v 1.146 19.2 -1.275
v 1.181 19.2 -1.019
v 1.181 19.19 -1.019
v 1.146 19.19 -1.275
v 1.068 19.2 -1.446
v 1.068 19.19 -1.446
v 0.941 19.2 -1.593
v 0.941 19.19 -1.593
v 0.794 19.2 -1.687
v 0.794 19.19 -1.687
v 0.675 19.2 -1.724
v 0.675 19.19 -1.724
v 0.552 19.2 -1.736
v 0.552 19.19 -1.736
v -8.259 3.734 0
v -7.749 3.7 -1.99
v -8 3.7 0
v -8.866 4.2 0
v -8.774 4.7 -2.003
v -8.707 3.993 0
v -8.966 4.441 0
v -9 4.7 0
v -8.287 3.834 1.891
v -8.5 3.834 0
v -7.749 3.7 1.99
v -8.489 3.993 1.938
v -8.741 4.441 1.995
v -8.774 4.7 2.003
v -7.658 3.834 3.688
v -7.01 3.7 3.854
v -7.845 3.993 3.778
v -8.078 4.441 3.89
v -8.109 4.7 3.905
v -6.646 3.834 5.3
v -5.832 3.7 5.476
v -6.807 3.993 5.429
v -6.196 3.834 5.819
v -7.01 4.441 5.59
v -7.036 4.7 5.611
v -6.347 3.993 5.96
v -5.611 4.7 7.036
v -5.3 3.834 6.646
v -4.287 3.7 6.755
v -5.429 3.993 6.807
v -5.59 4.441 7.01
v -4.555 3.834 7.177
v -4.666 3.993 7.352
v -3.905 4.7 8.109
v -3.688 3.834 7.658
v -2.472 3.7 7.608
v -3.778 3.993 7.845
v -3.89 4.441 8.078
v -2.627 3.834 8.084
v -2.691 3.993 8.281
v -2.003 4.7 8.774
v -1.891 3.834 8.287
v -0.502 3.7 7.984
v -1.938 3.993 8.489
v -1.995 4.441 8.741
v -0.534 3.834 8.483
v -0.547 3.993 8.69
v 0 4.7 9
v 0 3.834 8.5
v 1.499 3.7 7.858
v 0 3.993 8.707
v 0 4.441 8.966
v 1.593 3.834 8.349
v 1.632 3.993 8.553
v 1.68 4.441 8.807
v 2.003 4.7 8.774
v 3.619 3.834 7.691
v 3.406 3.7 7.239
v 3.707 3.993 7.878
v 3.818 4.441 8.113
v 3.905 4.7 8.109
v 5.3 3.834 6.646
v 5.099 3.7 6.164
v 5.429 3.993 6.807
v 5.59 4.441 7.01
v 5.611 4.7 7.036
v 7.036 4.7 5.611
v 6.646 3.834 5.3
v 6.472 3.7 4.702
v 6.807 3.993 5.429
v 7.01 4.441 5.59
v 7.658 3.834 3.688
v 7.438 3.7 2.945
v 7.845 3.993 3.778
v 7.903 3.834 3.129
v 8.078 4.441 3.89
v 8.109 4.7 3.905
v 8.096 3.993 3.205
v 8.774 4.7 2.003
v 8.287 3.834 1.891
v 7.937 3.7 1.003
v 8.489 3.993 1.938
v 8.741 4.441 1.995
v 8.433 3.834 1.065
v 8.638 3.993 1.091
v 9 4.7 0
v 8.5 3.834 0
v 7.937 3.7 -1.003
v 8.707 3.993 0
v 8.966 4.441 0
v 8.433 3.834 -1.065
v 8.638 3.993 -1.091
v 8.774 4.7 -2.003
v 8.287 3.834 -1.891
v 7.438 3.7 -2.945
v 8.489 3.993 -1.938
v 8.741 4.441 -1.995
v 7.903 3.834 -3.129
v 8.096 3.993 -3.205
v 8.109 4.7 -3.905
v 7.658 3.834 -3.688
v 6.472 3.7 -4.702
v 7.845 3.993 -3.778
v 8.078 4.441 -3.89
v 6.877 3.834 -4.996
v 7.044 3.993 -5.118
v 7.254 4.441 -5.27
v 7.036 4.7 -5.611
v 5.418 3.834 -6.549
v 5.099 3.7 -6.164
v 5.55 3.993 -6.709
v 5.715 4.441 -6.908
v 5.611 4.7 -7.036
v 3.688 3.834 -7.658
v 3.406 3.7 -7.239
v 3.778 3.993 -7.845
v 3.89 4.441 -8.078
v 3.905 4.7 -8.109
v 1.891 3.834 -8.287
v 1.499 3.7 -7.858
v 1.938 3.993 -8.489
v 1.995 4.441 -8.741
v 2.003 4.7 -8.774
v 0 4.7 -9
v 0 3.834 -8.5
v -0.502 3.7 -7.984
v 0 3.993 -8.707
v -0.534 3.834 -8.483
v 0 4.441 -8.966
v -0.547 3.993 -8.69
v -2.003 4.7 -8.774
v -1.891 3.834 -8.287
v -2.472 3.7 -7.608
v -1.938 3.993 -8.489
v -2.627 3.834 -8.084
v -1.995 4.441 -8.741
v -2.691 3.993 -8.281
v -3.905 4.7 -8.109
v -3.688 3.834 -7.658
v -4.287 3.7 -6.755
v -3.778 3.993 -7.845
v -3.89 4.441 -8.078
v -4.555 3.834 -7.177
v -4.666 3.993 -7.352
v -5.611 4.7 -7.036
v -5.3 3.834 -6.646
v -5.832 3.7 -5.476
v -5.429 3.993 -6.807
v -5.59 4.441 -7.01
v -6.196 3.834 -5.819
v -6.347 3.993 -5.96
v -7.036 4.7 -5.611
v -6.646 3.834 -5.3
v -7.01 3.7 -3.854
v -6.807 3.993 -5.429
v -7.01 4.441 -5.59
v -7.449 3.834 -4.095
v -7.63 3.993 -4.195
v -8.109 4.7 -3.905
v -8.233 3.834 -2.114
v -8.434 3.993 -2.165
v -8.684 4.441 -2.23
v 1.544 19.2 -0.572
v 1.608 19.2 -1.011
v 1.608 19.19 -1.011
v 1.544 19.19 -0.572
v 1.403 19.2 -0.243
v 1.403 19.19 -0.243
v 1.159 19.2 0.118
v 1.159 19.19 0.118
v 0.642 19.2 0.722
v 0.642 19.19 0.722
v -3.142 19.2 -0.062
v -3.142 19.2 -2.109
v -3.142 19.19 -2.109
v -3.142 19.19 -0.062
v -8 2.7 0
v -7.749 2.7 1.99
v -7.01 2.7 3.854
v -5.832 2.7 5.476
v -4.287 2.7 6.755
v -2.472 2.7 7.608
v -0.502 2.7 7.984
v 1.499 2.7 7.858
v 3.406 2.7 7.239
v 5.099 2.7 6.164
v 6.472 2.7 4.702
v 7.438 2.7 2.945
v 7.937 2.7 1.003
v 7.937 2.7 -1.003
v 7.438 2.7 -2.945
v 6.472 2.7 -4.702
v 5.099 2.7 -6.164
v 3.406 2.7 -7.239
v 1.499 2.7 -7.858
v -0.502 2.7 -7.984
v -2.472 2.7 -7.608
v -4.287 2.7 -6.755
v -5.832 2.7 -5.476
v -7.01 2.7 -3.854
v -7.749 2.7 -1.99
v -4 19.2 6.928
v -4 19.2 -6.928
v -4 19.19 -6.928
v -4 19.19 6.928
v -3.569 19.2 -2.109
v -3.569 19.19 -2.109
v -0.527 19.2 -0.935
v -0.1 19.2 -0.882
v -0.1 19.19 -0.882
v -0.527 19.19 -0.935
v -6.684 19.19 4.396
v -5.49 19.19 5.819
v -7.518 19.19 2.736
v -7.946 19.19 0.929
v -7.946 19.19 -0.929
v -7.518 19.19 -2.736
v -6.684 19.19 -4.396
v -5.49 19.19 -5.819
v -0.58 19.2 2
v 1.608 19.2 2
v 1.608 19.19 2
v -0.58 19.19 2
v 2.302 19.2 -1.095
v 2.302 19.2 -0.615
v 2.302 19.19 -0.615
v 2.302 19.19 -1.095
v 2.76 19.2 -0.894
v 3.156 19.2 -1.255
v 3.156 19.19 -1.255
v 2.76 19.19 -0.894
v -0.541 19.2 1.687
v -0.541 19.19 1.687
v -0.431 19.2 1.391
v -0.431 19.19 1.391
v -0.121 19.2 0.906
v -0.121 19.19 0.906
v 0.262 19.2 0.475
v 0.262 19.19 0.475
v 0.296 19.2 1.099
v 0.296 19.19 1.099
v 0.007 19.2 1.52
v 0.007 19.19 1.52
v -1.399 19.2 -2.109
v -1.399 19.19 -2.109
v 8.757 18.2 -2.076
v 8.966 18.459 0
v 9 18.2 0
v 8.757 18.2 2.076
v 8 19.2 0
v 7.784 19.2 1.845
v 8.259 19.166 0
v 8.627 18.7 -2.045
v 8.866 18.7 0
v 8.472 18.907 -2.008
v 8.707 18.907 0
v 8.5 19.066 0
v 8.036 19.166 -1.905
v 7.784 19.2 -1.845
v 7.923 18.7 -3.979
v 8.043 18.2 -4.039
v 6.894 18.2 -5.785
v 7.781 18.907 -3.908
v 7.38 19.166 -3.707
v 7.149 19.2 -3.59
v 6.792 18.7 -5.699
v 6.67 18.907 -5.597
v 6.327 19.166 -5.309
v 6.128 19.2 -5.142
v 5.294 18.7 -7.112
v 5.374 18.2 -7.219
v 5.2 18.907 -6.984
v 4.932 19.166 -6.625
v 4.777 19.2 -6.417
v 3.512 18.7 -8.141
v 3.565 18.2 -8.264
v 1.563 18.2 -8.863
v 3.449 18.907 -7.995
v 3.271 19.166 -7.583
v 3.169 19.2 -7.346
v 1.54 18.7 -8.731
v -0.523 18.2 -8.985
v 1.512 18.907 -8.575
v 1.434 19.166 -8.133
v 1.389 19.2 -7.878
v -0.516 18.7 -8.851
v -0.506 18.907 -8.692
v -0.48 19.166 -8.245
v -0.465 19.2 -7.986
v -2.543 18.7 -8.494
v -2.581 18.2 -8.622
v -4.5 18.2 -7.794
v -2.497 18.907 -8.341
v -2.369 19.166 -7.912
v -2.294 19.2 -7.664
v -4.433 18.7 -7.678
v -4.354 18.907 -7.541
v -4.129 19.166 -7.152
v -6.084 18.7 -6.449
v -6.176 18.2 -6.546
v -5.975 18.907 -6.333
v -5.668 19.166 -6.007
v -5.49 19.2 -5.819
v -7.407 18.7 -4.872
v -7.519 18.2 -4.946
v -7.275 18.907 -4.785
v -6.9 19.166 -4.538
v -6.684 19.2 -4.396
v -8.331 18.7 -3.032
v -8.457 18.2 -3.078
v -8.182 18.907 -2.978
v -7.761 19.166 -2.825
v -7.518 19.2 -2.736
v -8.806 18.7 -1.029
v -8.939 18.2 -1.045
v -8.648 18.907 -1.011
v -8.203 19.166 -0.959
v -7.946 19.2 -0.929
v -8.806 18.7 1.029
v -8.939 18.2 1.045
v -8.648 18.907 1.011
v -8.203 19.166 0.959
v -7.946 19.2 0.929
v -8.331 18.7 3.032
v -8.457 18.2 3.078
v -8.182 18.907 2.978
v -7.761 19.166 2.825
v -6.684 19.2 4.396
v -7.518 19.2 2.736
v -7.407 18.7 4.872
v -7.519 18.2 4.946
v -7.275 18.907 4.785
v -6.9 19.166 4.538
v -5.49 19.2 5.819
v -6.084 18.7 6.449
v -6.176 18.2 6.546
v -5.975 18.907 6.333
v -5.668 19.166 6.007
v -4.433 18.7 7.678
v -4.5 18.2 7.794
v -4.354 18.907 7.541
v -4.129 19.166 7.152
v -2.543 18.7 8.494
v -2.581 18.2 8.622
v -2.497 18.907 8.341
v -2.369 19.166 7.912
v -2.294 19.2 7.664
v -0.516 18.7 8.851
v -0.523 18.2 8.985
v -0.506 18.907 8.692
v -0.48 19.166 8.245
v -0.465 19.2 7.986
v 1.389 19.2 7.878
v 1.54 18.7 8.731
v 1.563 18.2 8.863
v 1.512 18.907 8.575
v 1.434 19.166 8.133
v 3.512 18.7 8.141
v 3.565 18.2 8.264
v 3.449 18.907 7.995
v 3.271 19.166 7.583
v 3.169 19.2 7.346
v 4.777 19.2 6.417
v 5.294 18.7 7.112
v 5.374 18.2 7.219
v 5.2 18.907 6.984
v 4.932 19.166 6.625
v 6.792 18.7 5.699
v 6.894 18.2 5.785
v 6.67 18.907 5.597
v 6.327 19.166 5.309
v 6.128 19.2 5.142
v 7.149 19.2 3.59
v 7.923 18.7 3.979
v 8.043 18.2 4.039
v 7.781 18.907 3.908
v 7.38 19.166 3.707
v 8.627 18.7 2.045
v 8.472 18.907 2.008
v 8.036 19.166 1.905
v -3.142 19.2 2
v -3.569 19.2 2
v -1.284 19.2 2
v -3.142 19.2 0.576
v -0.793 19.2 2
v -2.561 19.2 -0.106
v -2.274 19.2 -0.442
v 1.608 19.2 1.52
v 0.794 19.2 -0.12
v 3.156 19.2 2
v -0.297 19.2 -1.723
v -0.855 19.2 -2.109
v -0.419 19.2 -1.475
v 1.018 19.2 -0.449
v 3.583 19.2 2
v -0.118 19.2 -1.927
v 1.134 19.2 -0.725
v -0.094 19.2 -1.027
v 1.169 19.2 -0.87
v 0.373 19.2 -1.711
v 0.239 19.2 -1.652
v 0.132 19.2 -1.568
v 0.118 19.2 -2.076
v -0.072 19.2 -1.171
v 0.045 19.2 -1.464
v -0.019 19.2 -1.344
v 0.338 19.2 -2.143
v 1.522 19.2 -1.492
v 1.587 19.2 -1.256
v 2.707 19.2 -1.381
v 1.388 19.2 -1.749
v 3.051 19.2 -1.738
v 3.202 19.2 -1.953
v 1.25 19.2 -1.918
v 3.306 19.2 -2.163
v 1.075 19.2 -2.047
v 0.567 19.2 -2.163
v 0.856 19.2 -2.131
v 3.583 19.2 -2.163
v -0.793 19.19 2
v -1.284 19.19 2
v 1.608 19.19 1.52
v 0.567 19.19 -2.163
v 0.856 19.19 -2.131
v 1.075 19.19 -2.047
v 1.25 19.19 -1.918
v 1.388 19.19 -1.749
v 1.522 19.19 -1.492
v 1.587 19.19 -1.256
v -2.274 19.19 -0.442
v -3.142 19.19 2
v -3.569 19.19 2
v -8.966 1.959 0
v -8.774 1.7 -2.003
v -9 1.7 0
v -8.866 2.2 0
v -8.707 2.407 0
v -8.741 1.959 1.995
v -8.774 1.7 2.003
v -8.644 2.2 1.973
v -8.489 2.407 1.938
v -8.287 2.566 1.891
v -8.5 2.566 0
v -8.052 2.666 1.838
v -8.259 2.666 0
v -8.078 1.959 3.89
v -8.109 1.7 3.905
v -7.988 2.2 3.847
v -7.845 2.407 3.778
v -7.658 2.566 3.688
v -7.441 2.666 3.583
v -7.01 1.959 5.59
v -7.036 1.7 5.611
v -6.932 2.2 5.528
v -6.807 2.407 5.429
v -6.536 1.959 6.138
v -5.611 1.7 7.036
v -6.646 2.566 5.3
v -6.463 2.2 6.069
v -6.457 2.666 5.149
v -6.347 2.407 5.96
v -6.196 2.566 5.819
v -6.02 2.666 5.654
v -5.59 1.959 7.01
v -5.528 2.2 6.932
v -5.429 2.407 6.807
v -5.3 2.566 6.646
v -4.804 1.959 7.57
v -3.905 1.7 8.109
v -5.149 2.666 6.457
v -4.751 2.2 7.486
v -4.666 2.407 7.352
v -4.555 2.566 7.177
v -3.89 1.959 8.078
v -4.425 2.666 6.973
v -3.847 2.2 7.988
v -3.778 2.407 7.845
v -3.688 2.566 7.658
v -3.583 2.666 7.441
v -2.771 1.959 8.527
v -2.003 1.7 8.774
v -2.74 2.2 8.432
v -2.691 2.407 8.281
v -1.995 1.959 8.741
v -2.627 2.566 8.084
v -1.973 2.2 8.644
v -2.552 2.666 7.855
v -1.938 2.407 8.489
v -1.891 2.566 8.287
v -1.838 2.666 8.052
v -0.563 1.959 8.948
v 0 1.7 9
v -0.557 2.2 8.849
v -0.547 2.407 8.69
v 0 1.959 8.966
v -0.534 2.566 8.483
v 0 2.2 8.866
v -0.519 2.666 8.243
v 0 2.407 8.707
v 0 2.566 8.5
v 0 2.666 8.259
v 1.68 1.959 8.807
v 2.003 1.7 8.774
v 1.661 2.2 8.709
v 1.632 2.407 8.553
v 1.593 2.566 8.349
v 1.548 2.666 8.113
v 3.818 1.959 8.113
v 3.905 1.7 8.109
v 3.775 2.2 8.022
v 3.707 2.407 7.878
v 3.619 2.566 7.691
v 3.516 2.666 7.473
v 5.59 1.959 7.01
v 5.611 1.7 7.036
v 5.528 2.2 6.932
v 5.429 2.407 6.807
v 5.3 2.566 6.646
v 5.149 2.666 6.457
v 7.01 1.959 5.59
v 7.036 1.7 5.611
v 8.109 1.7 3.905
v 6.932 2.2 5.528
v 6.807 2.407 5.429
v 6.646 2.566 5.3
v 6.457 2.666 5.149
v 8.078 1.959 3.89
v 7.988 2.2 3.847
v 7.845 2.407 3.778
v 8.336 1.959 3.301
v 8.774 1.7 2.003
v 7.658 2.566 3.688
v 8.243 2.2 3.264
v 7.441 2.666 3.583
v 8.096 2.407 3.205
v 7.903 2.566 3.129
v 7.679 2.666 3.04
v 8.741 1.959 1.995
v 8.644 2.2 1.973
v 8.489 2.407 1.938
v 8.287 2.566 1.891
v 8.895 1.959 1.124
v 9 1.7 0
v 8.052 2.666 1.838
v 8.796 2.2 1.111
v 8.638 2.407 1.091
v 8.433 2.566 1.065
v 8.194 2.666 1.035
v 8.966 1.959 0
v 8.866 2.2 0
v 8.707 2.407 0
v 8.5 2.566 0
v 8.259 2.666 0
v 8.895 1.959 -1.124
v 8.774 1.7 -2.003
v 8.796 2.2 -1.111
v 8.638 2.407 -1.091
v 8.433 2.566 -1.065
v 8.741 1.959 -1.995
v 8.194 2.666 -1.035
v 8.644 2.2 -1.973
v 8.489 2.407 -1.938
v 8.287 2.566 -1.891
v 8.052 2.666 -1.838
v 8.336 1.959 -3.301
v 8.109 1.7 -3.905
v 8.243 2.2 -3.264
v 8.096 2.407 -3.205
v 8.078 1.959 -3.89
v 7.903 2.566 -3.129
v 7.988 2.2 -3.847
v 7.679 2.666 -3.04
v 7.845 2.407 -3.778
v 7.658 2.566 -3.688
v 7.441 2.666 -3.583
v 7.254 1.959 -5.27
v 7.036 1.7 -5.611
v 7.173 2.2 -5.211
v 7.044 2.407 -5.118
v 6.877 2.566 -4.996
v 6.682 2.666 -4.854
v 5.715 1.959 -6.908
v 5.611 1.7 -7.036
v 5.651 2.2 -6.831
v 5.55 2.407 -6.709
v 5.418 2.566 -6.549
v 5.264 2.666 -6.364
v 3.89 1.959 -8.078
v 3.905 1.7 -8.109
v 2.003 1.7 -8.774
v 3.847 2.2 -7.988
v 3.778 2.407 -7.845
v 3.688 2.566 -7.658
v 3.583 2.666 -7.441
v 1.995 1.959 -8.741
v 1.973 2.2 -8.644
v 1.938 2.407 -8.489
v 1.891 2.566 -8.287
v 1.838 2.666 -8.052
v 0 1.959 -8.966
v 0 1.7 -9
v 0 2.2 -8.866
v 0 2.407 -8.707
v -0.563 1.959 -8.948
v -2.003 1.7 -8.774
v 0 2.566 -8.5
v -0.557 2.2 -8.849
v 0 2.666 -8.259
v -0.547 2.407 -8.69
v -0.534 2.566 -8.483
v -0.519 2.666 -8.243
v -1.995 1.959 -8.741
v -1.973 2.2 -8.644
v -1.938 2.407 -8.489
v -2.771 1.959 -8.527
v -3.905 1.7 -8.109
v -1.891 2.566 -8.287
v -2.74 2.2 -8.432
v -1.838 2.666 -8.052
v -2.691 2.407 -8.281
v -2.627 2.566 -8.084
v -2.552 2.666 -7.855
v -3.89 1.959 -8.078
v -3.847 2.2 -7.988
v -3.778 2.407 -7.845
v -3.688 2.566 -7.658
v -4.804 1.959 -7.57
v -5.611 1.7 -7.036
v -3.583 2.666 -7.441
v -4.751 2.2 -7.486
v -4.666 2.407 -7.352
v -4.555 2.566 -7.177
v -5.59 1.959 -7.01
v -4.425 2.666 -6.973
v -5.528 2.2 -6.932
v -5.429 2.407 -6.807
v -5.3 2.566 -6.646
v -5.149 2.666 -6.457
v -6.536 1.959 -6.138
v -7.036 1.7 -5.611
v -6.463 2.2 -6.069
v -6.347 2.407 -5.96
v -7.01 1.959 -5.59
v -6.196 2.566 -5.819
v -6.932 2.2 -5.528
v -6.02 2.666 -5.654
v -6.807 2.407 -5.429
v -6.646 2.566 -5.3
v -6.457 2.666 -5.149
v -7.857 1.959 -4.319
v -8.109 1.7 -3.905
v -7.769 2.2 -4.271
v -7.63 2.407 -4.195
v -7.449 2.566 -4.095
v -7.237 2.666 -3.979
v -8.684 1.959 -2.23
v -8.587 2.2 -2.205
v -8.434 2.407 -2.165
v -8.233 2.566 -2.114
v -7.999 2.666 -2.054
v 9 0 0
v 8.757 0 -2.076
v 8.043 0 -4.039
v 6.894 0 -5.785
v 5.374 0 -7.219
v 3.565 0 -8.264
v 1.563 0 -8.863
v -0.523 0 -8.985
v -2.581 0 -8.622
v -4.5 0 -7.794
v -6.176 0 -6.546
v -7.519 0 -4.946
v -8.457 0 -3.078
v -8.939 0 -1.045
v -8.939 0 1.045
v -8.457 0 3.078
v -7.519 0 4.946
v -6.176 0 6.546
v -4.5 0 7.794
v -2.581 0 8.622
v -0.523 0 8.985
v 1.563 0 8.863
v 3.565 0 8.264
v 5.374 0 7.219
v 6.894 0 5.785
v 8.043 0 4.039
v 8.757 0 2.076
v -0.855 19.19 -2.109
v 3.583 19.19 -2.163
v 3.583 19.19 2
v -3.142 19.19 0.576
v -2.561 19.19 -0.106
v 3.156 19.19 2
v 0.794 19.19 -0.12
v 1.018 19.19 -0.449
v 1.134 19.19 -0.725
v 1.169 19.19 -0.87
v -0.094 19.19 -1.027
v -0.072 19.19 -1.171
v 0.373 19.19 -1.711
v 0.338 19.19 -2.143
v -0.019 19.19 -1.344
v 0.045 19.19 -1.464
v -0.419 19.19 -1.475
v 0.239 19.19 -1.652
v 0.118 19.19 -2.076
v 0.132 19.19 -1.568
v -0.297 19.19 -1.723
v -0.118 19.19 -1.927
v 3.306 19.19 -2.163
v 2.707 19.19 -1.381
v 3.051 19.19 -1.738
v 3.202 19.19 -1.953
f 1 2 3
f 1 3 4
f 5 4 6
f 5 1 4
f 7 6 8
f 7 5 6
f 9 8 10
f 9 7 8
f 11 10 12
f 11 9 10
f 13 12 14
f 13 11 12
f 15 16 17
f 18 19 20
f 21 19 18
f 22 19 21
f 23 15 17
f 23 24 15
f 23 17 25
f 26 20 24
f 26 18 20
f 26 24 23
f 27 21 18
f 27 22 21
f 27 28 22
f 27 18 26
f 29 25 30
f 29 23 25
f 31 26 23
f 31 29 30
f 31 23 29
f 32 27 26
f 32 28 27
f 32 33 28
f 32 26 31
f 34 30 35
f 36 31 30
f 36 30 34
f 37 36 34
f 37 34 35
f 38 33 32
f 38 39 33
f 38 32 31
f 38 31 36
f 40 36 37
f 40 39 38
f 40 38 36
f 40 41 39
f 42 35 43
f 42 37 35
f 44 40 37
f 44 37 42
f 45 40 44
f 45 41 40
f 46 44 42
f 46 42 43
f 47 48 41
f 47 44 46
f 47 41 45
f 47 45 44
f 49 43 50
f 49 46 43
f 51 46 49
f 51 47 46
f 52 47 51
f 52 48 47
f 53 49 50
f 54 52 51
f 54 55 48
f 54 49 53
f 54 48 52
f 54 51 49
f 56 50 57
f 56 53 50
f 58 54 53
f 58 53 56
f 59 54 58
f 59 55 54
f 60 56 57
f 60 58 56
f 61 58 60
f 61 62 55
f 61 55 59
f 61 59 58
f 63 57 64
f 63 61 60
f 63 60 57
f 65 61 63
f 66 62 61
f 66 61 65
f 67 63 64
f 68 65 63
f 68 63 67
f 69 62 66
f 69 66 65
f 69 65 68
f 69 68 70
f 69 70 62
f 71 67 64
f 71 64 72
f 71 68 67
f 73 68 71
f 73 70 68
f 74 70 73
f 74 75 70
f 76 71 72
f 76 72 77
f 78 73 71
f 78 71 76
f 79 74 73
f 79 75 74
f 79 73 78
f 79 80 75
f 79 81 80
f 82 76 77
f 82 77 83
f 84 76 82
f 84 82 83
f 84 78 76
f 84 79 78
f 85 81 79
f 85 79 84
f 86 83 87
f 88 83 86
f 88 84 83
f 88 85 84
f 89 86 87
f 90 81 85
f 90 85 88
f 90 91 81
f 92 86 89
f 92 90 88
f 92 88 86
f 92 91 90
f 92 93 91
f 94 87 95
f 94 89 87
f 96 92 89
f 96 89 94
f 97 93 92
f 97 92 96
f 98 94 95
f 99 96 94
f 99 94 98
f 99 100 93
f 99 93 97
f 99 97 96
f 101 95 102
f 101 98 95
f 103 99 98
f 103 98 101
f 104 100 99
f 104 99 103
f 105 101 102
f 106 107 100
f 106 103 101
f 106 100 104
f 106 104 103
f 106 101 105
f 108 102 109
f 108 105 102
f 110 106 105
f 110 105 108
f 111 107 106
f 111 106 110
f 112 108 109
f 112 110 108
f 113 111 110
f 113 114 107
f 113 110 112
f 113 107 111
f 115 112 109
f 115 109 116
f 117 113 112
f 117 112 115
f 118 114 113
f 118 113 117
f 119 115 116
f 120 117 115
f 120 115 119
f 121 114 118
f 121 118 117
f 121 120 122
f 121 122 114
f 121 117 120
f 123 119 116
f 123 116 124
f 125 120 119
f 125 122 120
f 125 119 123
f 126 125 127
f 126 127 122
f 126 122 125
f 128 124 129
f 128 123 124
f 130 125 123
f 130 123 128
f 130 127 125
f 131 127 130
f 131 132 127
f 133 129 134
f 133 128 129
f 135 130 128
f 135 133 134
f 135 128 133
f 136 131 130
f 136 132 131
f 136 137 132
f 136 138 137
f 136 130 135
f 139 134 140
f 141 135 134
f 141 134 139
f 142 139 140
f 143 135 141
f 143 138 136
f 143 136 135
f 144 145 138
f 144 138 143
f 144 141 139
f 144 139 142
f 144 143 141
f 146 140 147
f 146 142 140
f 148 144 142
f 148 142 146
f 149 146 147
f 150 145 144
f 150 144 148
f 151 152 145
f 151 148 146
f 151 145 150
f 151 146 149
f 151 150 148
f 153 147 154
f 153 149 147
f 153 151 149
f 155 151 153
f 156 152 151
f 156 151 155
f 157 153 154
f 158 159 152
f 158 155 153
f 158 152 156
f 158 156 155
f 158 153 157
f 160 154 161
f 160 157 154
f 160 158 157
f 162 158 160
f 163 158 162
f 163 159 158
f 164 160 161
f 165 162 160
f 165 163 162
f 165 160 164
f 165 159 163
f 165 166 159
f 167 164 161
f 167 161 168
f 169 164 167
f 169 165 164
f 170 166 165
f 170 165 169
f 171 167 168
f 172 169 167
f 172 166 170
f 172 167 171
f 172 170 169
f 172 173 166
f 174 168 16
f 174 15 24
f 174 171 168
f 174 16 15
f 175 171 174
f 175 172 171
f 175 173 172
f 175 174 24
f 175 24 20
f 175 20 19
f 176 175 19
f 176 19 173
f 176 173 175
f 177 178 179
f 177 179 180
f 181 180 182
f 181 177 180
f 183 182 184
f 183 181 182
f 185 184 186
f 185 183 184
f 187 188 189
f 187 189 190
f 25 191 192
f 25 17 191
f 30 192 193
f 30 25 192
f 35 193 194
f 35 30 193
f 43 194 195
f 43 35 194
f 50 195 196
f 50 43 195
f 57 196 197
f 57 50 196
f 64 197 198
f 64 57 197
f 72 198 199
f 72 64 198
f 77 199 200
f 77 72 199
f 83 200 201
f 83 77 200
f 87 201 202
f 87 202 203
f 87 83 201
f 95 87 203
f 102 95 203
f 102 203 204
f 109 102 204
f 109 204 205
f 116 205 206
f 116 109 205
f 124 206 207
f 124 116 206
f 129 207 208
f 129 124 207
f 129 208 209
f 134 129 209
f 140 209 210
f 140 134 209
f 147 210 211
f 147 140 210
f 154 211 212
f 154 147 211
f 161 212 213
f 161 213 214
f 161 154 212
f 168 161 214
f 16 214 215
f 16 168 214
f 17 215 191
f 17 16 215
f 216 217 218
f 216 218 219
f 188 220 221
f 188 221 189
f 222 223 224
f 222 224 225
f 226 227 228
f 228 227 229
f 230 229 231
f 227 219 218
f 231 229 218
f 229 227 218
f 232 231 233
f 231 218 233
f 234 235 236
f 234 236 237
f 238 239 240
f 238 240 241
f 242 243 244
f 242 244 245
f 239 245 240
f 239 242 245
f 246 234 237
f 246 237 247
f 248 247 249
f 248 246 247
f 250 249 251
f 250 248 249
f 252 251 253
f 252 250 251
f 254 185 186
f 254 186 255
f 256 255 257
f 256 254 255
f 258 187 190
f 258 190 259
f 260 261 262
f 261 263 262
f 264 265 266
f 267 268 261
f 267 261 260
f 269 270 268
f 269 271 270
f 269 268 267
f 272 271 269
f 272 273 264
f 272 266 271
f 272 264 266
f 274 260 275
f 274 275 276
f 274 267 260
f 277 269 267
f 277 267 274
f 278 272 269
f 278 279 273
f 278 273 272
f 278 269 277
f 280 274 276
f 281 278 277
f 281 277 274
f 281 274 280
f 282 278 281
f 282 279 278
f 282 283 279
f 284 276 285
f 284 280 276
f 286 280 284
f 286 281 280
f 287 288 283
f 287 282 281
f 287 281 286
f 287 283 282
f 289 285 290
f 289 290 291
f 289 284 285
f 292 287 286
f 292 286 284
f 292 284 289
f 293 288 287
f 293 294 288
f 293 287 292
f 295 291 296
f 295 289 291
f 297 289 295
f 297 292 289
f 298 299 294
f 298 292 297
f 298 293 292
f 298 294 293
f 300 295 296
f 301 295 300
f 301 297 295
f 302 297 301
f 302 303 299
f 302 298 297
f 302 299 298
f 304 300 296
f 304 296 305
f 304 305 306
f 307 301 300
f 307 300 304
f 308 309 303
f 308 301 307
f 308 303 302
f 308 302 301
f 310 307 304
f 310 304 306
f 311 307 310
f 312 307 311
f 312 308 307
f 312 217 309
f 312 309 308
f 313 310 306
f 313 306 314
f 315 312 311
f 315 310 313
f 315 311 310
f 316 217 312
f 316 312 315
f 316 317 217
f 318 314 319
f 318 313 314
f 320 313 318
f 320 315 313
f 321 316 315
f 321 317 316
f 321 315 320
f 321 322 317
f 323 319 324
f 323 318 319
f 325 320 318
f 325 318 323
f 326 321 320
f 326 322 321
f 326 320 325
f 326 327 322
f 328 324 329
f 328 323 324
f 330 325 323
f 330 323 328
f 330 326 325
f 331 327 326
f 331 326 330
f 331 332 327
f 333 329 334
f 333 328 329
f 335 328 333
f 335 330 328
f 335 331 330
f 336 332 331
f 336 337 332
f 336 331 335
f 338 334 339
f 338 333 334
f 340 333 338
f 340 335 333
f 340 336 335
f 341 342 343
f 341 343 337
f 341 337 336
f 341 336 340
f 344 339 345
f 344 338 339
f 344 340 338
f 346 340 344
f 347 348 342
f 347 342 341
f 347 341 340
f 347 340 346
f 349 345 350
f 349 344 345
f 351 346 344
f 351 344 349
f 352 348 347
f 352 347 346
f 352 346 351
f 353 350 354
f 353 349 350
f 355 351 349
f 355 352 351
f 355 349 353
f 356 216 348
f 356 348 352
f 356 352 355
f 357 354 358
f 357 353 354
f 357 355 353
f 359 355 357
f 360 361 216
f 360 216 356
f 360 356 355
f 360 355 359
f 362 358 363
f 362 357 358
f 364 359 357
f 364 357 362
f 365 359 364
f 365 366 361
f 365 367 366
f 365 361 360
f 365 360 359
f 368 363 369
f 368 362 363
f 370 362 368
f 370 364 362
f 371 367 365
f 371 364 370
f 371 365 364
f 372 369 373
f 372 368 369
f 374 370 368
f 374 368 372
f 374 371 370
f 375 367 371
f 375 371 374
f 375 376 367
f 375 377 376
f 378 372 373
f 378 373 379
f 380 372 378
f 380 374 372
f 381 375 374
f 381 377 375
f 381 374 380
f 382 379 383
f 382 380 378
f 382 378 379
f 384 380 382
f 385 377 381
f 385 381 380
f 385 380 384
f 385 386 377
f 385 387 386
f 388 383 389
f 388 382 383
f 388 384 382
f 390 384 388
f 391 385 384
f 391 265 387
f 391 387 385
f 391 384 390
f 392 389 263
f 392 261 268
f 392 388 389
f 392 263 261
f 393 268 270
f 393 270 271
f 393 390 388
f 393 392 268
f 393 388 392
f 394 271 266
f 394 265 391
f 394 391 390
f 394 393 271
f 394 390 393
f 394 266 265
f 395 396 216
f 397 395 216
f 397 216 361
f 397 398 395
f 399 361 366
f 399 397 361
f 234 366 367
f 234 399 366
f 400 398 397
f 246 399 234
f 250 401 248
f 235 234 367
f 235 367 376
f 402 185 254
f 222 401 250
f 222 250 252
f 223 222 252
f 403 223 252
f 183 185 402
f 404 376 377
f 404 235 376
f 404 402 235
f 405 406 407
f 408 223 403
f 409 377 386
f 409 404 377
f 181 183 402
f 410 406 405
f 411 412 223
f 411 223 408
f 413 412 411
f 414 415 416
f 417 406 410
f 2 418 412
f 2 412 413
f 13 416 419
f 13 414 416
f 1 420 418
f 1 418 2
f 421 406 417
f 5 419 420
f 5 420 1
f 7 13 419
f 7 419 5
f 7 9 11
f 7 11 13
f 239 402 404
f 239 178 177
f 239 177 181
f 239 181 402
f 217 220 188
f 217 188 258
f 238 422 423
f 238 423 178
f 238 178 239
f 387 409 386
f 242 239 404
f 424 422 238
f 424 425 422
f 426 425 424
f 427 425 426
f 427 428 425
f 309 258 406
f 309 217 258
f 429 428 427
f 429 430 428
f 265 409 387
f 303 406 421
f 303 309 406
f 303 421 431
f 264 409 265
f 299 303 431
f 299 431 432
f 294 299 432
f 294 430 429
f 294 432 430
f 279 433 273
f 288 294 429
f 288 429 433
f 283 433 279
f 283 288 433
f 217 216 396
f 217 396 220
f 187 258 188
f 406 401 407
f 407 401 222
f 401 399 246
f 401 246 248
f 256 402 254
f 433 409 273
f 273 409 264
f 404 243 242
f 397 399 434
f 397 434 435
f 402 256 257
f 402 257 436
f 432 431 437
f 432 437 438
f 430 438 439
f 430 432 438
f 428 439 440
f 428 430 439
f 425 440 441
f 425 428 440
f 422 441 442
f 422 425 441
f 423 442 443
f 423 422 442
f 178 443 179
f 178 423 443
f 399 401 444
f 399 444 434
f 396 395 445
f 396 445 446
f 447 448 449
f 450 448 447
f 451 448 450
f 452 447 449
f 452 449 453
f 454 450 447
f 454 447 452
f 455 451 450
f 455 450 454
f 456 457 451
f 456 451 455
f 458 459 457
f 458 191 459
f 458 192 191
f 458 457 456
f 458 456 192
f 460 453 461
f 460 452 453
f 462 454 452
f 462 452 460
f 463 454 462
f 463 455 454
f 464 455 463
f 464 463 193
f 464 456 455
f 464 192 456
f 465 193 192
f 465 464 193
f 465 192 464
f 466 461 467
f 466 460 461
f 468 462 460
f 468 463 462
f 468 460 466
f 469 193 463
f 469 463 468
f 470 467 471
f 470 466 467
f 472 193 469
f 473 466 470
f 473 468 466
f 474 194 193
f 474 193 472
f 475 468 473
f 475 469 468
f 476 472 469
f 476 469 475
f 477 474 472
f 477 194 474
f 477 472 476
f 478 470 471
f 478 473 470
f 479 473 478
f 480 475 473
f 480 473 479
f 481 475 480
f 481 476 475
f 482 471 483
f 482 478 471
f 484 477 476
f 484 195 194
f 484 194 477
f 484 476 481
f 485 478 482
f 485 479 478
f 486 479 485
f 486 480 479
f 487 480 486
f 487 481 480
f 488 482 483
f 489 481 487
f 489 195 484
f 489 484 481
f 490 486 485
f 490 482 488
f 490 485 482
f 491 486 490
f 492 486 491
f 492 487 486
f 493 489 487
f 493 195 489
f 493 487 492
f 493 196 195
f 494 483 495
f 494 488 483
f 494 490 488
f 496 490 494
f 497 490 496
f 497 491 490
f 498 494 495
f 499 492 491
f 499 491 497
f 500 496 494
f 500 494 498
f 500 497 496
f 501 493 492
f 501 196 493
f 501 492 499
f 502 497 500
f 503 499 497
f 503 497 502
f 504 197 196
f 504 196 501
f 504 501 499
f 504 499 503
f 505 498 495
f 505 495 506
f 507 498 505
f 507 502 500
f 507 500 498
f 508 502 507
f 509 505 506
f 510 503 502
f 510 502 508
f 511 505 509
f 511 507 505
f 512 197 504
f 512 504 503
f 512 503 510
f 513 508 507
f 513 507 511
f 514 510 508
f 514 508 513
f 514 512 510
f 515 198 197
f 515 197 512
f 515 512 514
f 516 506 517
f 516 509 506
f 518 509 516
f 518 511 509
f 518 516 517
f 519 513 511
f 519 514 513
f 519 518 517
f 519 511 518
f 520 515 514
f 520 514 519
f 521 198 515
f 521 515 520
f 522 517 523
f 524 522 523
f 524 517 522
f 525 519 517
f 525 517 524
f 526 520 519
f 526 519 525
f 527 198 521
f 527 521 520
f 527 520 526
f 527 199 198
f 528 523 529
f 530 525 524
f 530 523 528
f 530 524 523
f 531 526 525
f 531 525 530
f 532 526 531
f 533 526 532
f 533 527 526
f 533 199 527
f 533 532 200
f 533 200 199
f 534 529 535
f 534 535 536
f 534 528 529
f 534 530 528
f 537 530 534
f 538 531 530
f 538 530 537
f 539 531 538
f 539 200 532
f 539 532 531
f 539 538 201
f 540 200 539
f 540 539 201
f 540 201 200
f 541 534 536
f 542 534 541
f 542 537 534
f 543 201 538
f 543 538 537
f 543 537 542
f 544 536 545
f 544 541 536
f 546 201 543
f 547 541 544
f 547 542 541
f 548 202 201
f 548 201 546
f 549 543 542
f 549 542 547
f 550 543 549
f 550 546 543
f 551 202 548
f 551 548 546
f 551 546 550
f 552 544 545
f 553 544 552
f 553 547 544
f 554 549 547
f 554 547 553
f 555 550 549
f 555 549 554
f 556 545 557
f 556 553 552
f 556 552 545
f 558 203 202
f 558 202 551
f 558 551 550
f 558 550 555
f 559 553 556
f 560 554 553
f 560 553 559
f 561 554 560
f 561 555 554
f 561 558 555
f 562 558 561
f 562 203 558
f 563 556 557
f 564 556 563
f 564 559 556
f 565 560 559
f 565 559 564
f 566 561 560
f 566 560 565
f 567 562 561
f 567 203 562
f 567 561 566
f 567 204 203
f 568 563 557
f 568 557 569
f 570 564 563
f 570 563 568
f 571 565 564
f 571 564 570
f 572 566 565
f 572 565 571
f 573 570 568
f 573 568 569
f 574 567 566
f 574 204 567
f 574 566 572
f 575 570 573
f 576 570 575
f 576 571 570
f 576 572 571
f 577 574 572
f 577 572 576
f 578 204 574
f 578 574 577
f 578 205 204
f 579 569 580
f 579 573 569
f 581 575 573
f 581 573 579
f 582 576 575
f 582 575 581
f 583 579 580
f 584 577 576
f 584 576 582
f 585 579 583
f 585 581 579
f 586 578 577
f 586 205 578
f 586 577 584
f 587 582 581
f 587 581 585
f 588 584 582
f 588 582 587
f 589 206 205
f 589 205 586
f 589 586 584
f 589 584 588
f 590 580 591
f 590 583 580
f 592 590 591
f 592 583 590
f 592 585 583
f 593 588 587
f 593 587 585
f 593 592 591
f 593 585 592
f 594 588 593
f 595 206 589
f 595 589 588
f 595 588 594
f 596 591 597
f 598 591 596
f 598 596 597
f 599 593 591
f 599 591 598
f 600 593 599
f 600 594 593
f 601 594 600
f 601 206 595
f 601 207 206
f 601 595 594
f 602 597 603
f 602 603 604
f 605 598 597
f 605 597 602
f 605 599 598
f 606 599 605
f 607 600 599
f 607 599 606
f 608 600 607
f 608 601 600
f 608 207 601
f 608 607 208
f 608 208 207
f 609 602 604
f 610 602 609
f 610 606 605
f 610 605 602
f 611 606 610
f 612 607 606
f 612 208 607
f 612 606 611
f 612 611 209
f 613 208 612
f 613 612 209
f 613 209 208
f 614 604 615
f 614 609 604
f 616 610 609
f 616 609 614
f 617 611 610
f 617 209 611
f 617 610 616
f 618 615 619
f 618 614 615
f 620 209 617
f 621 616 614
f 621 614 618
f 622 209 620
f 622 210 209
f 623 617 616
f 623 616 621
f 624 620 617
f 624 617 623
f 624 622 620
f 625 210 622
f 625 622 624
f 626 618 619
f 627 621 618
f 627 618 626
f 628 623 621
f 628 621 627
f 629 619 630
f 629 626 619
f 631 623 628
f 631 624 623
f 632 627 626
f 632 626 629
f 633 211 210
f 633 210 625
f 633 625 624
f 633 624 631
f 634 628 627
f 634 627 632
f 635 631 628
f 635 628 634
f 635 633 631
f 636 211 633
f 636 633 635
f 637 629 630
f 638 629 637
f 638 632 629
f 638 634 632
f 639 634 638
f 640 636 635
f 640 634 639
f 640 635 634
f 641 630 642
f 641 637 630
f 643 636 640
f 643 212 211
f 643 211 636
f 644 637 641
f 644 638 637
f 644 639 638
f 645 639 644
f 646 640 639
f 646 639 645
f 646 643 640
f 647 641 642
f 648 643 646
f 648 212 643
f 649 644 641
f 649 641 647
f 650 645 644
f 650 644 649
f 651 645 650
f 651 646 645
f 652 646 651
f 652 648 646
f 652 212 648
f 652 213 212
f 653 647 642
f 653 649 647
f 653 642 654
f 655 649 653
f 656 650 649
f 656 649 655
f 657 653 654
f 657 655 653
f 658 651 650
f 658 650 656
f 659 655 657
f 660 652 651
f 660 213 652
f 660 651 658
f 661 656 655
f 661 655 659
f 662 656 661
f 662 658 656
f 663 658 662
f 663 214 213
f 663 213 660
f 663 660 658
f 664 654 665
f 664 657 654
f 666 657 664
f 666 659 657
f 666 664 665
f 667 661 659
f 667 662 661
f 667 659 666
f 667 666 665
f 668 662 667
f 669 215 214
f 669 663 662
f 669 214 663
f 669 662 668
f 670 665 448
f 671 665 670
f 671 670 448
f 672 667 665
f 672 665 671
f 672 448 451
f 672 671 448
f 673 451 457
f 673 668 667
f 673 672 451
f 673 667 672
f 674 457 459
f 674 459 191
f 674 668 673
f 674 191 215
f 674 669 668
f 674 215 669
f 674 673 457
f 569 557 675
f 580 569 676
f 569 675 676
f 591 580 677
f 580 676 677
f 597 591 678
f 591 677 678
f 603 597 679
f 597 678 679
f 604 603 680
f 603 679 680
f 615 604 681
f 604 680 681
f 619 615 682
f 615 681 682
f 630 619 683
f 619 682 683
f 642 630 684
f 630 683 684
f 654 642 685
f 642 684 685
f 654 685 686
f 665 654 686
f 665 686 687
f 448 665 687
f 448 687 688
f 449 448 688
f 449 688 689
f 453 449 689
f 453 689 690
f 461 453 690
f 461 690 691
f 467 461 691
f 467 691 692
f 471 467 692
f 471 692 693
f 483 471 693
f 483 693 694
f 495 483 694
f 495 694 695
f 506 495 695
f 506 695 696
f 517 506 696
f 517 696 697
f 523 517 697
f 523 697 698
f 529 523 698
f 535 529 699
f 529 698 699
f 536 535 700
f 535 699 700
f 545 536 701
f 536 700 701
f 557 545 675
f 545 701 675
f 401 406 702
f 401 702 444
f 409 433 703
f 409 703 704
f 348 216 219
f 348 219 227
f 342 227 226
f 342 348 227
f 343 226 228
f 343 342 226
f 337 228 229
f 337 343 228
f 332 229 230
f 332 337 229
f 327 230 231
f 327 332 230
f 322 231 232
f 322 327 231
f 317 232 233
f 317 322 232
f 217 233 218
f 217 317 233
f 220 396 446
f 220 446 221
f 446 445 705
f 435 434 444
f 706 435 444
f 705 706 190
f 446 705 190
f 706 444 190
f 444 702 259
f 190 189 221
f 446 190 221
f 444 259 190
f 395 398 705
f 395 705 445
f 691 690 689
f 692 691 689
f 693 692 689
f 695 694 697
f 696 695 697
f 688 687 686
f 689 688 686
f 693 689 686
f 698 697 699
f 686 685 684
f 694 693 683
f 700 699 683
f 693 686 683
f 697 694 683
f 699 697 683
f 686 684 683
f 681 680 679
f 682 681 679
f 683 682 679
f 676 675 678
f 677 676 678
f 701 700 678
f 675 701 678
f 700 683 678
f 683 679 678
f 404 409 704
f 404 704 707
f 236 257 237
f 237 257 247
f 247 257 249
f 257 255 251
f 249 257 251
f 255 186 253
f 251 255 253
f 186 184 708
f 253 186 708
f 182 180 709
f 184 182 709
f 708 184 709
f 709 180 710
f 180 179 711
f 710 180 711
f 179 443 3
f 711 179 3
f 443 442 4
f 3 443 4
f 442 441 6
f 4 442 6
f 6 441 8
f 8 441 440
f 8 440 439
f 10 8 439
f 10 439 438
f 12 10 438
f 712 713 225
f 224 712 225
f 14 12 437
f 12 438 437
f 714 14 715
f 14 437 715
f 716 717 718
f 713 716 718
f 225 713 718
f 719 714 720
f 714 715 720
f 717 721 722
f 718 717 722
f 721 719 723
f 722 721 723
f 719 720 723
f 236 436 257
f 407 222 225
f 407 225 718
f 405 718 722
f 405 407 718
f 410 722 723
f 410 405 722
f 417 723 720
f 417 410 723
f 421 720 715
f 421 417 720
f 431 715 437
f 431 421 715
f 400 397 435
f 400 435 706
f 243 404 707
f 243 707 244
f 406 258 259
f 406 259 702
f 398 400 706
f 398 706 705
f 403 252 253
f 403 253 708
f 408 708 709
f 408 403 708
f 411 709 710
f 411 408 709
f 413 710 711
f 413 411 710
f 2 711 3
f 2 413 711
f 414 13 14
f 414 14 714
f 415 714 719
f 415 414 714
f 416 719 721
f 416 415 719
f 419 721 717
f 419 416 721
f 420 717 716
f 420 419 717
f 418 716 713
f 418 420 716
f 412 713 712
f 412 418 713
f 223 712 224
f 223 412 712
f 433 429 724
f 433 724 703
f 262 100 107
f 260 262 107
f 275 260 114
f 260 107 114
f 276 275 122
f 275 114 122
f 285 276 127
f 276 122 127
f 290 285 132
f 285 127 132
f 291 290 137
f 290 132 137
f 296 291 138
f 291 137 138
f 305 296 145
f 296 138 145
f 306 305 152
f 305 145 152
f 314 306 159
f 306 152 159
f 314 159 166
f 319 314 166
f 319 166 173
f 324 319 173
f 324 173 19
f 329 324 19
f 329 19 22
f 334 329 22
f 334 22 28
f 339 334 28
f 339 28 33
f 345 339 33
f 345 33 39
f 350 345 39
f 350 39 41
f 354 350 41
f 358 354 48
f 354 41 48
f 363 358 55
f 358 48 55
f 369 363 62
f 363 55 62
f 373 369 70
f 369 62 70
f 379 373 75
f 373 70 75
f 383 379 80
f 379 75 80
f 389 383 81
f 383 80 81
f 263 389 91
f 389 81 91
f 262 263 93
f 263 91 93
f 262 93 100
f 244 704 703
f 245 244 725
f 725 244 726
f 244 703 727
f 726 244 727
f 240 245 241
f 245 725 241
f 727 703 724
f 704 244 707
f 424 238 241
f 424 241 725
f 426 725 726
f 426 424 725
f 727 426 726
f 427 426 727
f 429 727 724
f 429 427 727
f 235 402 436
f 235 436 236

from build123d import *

# Parameters (mm, degrees)
SKETCH1_R           = 9
BOSS_EXTRUDE1_DEPTH = 19.2
FILLET1_R           = 1
CUT_EXTRUDE1_DEPTH  = 0.01
CUT_EXTRUDE2_DEPTH  = 0.01


with BuildPart() as part:
    # Sketch1 → Boss-Extrude1 (new body)
    with BuildSketch(Plane(origin=(0, 0, 0), x_dir=(1, 0, 0), z_dir=(0, 1, 0))):
        Circle(SKETCH1_R)
    extrude(amount=BOSS_EXTRUDE1_DEPTH)

    # Fillet1
    fillet1_edges = [part.edges().sort_by_distance(p)[0] for p in [
        (-9, 19.2, 0),
    ]]
    fillet(fillet1_edges, radius=FILLET1_R)

    # Sketch2 → Cut-Revolve1 (revolve, cut)
    with BuildSketch(Plane.XY):
        with BuildLine():
            Line((-9, 4.7), (-9, 1.7))
            ThreePointArc((-9, 1.7), (-8.707106781, 2.407106781), (-8, 2.7))
            Line((-8, 2.7), (-8, 3.7))
            ThreePointArc((-8, 3.7), (-8.707106781, 3.992893219), (-9, 4.7))
        make_face()
    revolve(axis=Axis((0, -0.75, 0), (0, 1, 0)), mode=Mode.SUBTRACT)

    # Sketch3 → Cut-Extrude1 (cut)
    with BuildSketch(Plane(origin=(0, 19.2, 0), x_dir=(1, 0, 0), z_dir=(0, 1, 0))):
        with BuildLine():
            Line((-4, 6.92820323), (-4, -6.92820323))
            ThreePointArc((-4, -6.92820323), (-8, 0), (-4, 6.92820323))
        make_face()
    extrude(amount=-CUT_EXTRUDE1_DEPTH, mode=Mode.SUBTRACT)

    # Sketch4 → Cut-Extrude2 (cut)
    with BuildSketch(Plane(origin=(0, 19.2, 0), x_dir=(1, 0, 0), z_dir=(0, 1, 0))):
        Polygon((-3.568517869, -2), (-3.568517869, 2.109309896), (-3.141576581, 2.109309896), (-3.141576581, 0.062159775), (-1.398788902, 2.109309896), (-0.855105856, 2.109309896), (-2.27435209, 0.44240436), (-0.793399498, -2), (-1.283714883, -2), (-2.561203268, 0.105521), (-3.141576581, -0.575750547), (-3.141576581, -2), align=None)
        with BuildLine():
            Line((1.608145247, -1.519691051), (1.608145247, -2))
            Line((1.608145247, -2), (-0.579928854, -2))
            add(Edge.make_bspline(
                [(-0.579928854, -2), (-0.580030163, -1.974973894), (-0.580235417, -1.924270595), (-0.573411363, -1.84696894), (-0.559390758, -1.767795767), (-0.541487877, -1.685694894), (-0.516103543, -1.601746123), (-0.485028409, -1.515541552), (-0.448362485, -1.427295796), (-0.405430031, -1.336486232), (-0.355261299, -1.242241802), (-0.29472218, -1.144956808), (-0.22514772, -1.042886175), (-0.146445909, -0.936652158), (-0.057077523, -0.827262261), (0.040304888, -0.713092602), (0.147091103, -0.594380978), (0.223123115, -0.515484132), (0.262279546, -0.474852313)],
                knots=[0, 0, 0, 0, 7.5053e-05, 0.000152058, 0.000232392, 0.000316145, 0.000404002, 0.000495264, 0.000590967, 0.000690561, 0.000796512, 0.000911068, 0.001034111, 0.001167032, 0.001307551, 0.001457781, 0.001617197, 0.001786472, 0.001786472, 0.001786472, 0.001786472], degree=3))
            add(Edge.make_bspline(
                [(0.262279546, -0.474852313), (0.307783709, -0.427786045), (0.395398434, -0.337163605), (0.518707793, -0.20335402), (0.63074673, -0.078979672), (0.729276779, 0.038208492), (0.81604721, 0.146614403), (0.891931027, 0.246083065), (0.953301744, 0.338871858), (1.019564668, 0.4480512), (1.082736953, 0.578027477), (1.138584831, 0.729535393), (1.17466971, 0.875998462), (1.179068277, 0.972558443), (1.181203959, 1.019442194)],
                knots=[0, 0, 0, 0, 0.000196392, 0.000378137, 0.000545859, 0.000698537, 0.000837361, 0.000962441, 0.001073684, 0.001170929, 0.001345461, 0.001506112, 0.00165499, 0.001795499, 0.001795499, 0.001795499, 0.001795499], degree=3))
            add(Edge.make_bspline(
                [(1.181203959, 1.019442194), (1.180906167, 1.045325757), (1.180324549, 1.095879063), (1.17044076, 1.169706759), (1.156345175, 1.239928333), (1.137734826, 1.307051289), (1.111347496, 1.369973118), (1.079731025, 1.429130374), (1.042696817, 1.484790988), (1.00043516, 1.536137563), (0.953830167, 1.582458591), (0.904715044, 1.624072216), (0.851812101, 1.657752353), (0.79729566, 1.687071594), (0.739323506, 1.708320386), (0.679116382, 1.72451746), (0.616117255, 1.733650108), (0.573340408, 1.735033988), (0.551632333, 1.735736269)],
                knots=[0, 0, 0, 0, 7.759e-05, 0.000151542, 0.000223007, 0.000292419, 0.000360091, 0.000427242, 0.000493386, 0.00056033, 0.000626369, 0.000690322, 0.000753001, 0.00081417, 0.000875656, 0.00093775, 0.001000959, 0.001066087, 0.001066087, 0.001066087, 0.001066087], degree=3))
            add(Edge.make_bspline(
                [(0.551632333, 1.735736269), (0.528226771, 1.735245249), (0.48253804, 1.734286754), (0.415943734, 1.722375263), (0.352134158, 1.706440041), (0.291433109, 1.681725902), (0.234284586, 1.650068594), (0.179865337, 1.611963), (0.129240549, 1.566688844), (0.081390427, 1.51520671), (0.0394437, 1.456500761), (0.00093045, 1.392974506), (-0.029397111, 1.321936977), (-0.055184289, 1.245578615), (-0.075379706, 1.163009336), (-0.08887873, 1.074540543), (-0.098778232, 0.980193805), (-0.099334188, 0.9152366), (-0.099619905, 0.881853693)],
                knots=[0, 0, 0, 0, 7.0124e-05, 0.000136886, 0.000202418, 0.000267144, 0.000332829, 0.000398068, 0.000466002, 0.00053623, 0.00060845, 0.0006821, 0.000758639, 0.000839594, 0.000923728, 0.001013247, 0.00110792, 0.001208016, 0.001208016, 0.001208016, 0.001208016], degree=3))
            Line((-0.099619905, 0.881853693), (-0.526561193, 0.935221354))
            add(Edge.make_bspline(
                [(-0.526561193, 0.935221354), (-0.522161355, 0.984764496), (-0.51362547, 1.080880441), (-0.491229682, 1.220023192), (-0.460151497, 1.349122738), (-0.423259749, 1.469467004), (-0.37684568, 1.579562455), (-0.32495328, 1.681412702), (-0.263448356, 1.772803706), (-0.194860218, 1.854865311), (-0.119763265, 1.927670687), (-0.038580752, 1.990514656), (0.048577079, 2.043490936), (0.140714878, 2.088035445), (0.239737182, 2.121299299), (0.343867527, 2.145441457), (0.453952846, 2.159744427), (0.529075899, 2.161685405), (0.567475857, 2.162677557)],
                knots=[0, 0, 0, 0, 0.000149186, 0.000289427, 0.000422308, 0.000547317, 0.00066656, 0.000780315, 0.000889708, 0.000996261, 0.001100641, 0.001202885, 0.001303565, 0.001406135, 0.001509242, 0.001616244, 0.001726397, 0.001841579, 0.001841579, 0.001841579, 0.001841579], degree=3))
            add(Edge.make_bspline(
                [(0.567475857, 2.162677557), (0.608936701, 2.161460519), (0.689667848, 2.159090743), (0.807193372, 2.143475809), (0.916807406, 2.115932118), (1.018999557, 2.077604645), (1.112542526, 2.027147582), (1.198957878, 1.966622956), (1.276803441, 1.894190881), (1.346078887, 1.811773402), (1.407300961, 1.722793837), (1.460721222, 1.629751813), (1.507059009, 1.534189022), (1.543273299, 1.435042114), (1.573516087, 1.33364172), (1.592515267, 1.22845074), (1.605890551, 1.120682885), (1.607389437, 1.047836248), (1.608145247, 1.011103497)],
                knots=[0, 0, 0, 0, 0.000124384, 0.000242196, 0.000354845, 0.000462789, 0.000568739, 0.00067285, 0.000778475, 0.00088674, 0.000995223, 0.001102066, 0.001208364, 0.001313378, 0.001418413, 0.00152537, 0.001633664, 0.001743813, 0.001743813, 0.001743813, 0.001743813], degree=3))
            add(Edge.make_bspline(
                [(1.608145247, 1.011103497), (1.607433131, 0.978008896), (1.606018176, 0.912250864), (1.596813778, 0.814136149), (1.580566309, 0.717340512), (1.559469686, 0.620933232), (1.529533435, 0.526407037), (1.495644001, 0.432260621), (1.454538746, 0.339556084), (1.406012971, 0.24648385), (1.349195592, 0.149750322), (1.281109579, 0.047590004), (1.203017594, -0.062727889), (1.111747658, -0.179237735), (1.011722256, -0.305290035), (0.898522434, -0.437708632), (0.774356786, -0.577661228), (0.686878474, -0.672623554), (0.641690261, -0.721677745)],
                knots=[0, 0, 0, 0, 9.9287e-05, 0.00019728, 0.000295297, 0.000393613, 0.000493053, 0.000592508, 0.000693685, 0.000796994, 0.000907257, 0.001030065, 0.001165193, 0.001312635, 0.001473988, 0.001647918, 0.001835167, 0.002035249, 0.002035249, 0.002035249, 0.002035249], degree=3))
            add(Edge.make_bspline(
                [(0.641690261, -0.721677745), (0.613003238, -0.752199341), (0.558180033, -0.810528561), (0.480543807, -0.894931672), (0.410876198, -0.971712133), (0.347660418, -1.039789018), (0.294021708, -1.101451752), (0.24751759, -1.155071433), (0.209520156, -1.201308971), (0.152573929, -1.273997274), (0.080749983, -1.376414434), (0.031128398, -1.472967089), (0.007115417, -1.519691051)],
                knots=[0, 0, 0, 0, 0.00012566, 0.000240146, 0.000344029, 0.000436694, 0.000518825, 0.000589192, 0.000649623, 0.000698331, 0.000866252, 0.00102371, 0.00102371, 0.00102371, 0.00102371], degree=3))
            Line((0.007115417, -1.519691051), (1.608145247, -1.519691051))
        make_face()
        with BuildLine():
            Line((3.582748703, -2), (3.155807415, -2))
            Line((3.155807415, -2), (3.155807415, 1.25542732))
            add(Edge.make_bspline(
                [(3.155807415, 1.25542732), (3.129587392, 1.225245825), (3.075246421, 1.162694706), (2.980913282, 1.0737383), (2.87578942, 0.982006095), (2.759403349, 0.892993451), (2.640815205, 0.807733741), (2.523687376, 0.732746343), (2.412409759, 0.667501655), (2.337758183, 0.63203815), (2.301924839, 0.615015388)],
                knots=[0, 0, 0, 0, 0.000119871, 0.000248434, 0.000388536, 0.000538317, 0.000687792, 0.000826575, 0.000955448, 0.001074411, 0.001074411, 0.001074411, 0.001074411], degree=3))
            Line((2.301924839, 0.615015388), (2.301924839, 1.095324337))
            add(Edge.make_bspline(
                [(2.301924839, 1.095324337), (2.359511914, 1.12998243), (2.474192959, 1.199001848), (2.634876111, 1.318565767), (2.786671409, 1.447615361), (2.925041729, 1.587502781), (3.048937153, 1.731705768), (3.155279444, 1.875620528), (3.242473386, 2.017717985), (3.285244807, 2.115464643), (3.305903962, 2.162677557)],
                knots=[0, 0, 0, 0, 0.000201529, 0.000401333, 0.000600042, 0.00079875, 0.000990948, 0.001169906, 0.001335222, 0.001489675, 0.001489675, 0.001489675, 0.001489675], degree=3))
            Line((3.305903962, 2.162677557), (3.582748703, 2.162677557))
            Line((3.582748703, 2.162677557), (3.582748703, -2))
        make_face()
    extrude(amount=-CUT_EXTRUDE2_DEPTH, mode=Mode.SUBTRACT)


solid = part.part
